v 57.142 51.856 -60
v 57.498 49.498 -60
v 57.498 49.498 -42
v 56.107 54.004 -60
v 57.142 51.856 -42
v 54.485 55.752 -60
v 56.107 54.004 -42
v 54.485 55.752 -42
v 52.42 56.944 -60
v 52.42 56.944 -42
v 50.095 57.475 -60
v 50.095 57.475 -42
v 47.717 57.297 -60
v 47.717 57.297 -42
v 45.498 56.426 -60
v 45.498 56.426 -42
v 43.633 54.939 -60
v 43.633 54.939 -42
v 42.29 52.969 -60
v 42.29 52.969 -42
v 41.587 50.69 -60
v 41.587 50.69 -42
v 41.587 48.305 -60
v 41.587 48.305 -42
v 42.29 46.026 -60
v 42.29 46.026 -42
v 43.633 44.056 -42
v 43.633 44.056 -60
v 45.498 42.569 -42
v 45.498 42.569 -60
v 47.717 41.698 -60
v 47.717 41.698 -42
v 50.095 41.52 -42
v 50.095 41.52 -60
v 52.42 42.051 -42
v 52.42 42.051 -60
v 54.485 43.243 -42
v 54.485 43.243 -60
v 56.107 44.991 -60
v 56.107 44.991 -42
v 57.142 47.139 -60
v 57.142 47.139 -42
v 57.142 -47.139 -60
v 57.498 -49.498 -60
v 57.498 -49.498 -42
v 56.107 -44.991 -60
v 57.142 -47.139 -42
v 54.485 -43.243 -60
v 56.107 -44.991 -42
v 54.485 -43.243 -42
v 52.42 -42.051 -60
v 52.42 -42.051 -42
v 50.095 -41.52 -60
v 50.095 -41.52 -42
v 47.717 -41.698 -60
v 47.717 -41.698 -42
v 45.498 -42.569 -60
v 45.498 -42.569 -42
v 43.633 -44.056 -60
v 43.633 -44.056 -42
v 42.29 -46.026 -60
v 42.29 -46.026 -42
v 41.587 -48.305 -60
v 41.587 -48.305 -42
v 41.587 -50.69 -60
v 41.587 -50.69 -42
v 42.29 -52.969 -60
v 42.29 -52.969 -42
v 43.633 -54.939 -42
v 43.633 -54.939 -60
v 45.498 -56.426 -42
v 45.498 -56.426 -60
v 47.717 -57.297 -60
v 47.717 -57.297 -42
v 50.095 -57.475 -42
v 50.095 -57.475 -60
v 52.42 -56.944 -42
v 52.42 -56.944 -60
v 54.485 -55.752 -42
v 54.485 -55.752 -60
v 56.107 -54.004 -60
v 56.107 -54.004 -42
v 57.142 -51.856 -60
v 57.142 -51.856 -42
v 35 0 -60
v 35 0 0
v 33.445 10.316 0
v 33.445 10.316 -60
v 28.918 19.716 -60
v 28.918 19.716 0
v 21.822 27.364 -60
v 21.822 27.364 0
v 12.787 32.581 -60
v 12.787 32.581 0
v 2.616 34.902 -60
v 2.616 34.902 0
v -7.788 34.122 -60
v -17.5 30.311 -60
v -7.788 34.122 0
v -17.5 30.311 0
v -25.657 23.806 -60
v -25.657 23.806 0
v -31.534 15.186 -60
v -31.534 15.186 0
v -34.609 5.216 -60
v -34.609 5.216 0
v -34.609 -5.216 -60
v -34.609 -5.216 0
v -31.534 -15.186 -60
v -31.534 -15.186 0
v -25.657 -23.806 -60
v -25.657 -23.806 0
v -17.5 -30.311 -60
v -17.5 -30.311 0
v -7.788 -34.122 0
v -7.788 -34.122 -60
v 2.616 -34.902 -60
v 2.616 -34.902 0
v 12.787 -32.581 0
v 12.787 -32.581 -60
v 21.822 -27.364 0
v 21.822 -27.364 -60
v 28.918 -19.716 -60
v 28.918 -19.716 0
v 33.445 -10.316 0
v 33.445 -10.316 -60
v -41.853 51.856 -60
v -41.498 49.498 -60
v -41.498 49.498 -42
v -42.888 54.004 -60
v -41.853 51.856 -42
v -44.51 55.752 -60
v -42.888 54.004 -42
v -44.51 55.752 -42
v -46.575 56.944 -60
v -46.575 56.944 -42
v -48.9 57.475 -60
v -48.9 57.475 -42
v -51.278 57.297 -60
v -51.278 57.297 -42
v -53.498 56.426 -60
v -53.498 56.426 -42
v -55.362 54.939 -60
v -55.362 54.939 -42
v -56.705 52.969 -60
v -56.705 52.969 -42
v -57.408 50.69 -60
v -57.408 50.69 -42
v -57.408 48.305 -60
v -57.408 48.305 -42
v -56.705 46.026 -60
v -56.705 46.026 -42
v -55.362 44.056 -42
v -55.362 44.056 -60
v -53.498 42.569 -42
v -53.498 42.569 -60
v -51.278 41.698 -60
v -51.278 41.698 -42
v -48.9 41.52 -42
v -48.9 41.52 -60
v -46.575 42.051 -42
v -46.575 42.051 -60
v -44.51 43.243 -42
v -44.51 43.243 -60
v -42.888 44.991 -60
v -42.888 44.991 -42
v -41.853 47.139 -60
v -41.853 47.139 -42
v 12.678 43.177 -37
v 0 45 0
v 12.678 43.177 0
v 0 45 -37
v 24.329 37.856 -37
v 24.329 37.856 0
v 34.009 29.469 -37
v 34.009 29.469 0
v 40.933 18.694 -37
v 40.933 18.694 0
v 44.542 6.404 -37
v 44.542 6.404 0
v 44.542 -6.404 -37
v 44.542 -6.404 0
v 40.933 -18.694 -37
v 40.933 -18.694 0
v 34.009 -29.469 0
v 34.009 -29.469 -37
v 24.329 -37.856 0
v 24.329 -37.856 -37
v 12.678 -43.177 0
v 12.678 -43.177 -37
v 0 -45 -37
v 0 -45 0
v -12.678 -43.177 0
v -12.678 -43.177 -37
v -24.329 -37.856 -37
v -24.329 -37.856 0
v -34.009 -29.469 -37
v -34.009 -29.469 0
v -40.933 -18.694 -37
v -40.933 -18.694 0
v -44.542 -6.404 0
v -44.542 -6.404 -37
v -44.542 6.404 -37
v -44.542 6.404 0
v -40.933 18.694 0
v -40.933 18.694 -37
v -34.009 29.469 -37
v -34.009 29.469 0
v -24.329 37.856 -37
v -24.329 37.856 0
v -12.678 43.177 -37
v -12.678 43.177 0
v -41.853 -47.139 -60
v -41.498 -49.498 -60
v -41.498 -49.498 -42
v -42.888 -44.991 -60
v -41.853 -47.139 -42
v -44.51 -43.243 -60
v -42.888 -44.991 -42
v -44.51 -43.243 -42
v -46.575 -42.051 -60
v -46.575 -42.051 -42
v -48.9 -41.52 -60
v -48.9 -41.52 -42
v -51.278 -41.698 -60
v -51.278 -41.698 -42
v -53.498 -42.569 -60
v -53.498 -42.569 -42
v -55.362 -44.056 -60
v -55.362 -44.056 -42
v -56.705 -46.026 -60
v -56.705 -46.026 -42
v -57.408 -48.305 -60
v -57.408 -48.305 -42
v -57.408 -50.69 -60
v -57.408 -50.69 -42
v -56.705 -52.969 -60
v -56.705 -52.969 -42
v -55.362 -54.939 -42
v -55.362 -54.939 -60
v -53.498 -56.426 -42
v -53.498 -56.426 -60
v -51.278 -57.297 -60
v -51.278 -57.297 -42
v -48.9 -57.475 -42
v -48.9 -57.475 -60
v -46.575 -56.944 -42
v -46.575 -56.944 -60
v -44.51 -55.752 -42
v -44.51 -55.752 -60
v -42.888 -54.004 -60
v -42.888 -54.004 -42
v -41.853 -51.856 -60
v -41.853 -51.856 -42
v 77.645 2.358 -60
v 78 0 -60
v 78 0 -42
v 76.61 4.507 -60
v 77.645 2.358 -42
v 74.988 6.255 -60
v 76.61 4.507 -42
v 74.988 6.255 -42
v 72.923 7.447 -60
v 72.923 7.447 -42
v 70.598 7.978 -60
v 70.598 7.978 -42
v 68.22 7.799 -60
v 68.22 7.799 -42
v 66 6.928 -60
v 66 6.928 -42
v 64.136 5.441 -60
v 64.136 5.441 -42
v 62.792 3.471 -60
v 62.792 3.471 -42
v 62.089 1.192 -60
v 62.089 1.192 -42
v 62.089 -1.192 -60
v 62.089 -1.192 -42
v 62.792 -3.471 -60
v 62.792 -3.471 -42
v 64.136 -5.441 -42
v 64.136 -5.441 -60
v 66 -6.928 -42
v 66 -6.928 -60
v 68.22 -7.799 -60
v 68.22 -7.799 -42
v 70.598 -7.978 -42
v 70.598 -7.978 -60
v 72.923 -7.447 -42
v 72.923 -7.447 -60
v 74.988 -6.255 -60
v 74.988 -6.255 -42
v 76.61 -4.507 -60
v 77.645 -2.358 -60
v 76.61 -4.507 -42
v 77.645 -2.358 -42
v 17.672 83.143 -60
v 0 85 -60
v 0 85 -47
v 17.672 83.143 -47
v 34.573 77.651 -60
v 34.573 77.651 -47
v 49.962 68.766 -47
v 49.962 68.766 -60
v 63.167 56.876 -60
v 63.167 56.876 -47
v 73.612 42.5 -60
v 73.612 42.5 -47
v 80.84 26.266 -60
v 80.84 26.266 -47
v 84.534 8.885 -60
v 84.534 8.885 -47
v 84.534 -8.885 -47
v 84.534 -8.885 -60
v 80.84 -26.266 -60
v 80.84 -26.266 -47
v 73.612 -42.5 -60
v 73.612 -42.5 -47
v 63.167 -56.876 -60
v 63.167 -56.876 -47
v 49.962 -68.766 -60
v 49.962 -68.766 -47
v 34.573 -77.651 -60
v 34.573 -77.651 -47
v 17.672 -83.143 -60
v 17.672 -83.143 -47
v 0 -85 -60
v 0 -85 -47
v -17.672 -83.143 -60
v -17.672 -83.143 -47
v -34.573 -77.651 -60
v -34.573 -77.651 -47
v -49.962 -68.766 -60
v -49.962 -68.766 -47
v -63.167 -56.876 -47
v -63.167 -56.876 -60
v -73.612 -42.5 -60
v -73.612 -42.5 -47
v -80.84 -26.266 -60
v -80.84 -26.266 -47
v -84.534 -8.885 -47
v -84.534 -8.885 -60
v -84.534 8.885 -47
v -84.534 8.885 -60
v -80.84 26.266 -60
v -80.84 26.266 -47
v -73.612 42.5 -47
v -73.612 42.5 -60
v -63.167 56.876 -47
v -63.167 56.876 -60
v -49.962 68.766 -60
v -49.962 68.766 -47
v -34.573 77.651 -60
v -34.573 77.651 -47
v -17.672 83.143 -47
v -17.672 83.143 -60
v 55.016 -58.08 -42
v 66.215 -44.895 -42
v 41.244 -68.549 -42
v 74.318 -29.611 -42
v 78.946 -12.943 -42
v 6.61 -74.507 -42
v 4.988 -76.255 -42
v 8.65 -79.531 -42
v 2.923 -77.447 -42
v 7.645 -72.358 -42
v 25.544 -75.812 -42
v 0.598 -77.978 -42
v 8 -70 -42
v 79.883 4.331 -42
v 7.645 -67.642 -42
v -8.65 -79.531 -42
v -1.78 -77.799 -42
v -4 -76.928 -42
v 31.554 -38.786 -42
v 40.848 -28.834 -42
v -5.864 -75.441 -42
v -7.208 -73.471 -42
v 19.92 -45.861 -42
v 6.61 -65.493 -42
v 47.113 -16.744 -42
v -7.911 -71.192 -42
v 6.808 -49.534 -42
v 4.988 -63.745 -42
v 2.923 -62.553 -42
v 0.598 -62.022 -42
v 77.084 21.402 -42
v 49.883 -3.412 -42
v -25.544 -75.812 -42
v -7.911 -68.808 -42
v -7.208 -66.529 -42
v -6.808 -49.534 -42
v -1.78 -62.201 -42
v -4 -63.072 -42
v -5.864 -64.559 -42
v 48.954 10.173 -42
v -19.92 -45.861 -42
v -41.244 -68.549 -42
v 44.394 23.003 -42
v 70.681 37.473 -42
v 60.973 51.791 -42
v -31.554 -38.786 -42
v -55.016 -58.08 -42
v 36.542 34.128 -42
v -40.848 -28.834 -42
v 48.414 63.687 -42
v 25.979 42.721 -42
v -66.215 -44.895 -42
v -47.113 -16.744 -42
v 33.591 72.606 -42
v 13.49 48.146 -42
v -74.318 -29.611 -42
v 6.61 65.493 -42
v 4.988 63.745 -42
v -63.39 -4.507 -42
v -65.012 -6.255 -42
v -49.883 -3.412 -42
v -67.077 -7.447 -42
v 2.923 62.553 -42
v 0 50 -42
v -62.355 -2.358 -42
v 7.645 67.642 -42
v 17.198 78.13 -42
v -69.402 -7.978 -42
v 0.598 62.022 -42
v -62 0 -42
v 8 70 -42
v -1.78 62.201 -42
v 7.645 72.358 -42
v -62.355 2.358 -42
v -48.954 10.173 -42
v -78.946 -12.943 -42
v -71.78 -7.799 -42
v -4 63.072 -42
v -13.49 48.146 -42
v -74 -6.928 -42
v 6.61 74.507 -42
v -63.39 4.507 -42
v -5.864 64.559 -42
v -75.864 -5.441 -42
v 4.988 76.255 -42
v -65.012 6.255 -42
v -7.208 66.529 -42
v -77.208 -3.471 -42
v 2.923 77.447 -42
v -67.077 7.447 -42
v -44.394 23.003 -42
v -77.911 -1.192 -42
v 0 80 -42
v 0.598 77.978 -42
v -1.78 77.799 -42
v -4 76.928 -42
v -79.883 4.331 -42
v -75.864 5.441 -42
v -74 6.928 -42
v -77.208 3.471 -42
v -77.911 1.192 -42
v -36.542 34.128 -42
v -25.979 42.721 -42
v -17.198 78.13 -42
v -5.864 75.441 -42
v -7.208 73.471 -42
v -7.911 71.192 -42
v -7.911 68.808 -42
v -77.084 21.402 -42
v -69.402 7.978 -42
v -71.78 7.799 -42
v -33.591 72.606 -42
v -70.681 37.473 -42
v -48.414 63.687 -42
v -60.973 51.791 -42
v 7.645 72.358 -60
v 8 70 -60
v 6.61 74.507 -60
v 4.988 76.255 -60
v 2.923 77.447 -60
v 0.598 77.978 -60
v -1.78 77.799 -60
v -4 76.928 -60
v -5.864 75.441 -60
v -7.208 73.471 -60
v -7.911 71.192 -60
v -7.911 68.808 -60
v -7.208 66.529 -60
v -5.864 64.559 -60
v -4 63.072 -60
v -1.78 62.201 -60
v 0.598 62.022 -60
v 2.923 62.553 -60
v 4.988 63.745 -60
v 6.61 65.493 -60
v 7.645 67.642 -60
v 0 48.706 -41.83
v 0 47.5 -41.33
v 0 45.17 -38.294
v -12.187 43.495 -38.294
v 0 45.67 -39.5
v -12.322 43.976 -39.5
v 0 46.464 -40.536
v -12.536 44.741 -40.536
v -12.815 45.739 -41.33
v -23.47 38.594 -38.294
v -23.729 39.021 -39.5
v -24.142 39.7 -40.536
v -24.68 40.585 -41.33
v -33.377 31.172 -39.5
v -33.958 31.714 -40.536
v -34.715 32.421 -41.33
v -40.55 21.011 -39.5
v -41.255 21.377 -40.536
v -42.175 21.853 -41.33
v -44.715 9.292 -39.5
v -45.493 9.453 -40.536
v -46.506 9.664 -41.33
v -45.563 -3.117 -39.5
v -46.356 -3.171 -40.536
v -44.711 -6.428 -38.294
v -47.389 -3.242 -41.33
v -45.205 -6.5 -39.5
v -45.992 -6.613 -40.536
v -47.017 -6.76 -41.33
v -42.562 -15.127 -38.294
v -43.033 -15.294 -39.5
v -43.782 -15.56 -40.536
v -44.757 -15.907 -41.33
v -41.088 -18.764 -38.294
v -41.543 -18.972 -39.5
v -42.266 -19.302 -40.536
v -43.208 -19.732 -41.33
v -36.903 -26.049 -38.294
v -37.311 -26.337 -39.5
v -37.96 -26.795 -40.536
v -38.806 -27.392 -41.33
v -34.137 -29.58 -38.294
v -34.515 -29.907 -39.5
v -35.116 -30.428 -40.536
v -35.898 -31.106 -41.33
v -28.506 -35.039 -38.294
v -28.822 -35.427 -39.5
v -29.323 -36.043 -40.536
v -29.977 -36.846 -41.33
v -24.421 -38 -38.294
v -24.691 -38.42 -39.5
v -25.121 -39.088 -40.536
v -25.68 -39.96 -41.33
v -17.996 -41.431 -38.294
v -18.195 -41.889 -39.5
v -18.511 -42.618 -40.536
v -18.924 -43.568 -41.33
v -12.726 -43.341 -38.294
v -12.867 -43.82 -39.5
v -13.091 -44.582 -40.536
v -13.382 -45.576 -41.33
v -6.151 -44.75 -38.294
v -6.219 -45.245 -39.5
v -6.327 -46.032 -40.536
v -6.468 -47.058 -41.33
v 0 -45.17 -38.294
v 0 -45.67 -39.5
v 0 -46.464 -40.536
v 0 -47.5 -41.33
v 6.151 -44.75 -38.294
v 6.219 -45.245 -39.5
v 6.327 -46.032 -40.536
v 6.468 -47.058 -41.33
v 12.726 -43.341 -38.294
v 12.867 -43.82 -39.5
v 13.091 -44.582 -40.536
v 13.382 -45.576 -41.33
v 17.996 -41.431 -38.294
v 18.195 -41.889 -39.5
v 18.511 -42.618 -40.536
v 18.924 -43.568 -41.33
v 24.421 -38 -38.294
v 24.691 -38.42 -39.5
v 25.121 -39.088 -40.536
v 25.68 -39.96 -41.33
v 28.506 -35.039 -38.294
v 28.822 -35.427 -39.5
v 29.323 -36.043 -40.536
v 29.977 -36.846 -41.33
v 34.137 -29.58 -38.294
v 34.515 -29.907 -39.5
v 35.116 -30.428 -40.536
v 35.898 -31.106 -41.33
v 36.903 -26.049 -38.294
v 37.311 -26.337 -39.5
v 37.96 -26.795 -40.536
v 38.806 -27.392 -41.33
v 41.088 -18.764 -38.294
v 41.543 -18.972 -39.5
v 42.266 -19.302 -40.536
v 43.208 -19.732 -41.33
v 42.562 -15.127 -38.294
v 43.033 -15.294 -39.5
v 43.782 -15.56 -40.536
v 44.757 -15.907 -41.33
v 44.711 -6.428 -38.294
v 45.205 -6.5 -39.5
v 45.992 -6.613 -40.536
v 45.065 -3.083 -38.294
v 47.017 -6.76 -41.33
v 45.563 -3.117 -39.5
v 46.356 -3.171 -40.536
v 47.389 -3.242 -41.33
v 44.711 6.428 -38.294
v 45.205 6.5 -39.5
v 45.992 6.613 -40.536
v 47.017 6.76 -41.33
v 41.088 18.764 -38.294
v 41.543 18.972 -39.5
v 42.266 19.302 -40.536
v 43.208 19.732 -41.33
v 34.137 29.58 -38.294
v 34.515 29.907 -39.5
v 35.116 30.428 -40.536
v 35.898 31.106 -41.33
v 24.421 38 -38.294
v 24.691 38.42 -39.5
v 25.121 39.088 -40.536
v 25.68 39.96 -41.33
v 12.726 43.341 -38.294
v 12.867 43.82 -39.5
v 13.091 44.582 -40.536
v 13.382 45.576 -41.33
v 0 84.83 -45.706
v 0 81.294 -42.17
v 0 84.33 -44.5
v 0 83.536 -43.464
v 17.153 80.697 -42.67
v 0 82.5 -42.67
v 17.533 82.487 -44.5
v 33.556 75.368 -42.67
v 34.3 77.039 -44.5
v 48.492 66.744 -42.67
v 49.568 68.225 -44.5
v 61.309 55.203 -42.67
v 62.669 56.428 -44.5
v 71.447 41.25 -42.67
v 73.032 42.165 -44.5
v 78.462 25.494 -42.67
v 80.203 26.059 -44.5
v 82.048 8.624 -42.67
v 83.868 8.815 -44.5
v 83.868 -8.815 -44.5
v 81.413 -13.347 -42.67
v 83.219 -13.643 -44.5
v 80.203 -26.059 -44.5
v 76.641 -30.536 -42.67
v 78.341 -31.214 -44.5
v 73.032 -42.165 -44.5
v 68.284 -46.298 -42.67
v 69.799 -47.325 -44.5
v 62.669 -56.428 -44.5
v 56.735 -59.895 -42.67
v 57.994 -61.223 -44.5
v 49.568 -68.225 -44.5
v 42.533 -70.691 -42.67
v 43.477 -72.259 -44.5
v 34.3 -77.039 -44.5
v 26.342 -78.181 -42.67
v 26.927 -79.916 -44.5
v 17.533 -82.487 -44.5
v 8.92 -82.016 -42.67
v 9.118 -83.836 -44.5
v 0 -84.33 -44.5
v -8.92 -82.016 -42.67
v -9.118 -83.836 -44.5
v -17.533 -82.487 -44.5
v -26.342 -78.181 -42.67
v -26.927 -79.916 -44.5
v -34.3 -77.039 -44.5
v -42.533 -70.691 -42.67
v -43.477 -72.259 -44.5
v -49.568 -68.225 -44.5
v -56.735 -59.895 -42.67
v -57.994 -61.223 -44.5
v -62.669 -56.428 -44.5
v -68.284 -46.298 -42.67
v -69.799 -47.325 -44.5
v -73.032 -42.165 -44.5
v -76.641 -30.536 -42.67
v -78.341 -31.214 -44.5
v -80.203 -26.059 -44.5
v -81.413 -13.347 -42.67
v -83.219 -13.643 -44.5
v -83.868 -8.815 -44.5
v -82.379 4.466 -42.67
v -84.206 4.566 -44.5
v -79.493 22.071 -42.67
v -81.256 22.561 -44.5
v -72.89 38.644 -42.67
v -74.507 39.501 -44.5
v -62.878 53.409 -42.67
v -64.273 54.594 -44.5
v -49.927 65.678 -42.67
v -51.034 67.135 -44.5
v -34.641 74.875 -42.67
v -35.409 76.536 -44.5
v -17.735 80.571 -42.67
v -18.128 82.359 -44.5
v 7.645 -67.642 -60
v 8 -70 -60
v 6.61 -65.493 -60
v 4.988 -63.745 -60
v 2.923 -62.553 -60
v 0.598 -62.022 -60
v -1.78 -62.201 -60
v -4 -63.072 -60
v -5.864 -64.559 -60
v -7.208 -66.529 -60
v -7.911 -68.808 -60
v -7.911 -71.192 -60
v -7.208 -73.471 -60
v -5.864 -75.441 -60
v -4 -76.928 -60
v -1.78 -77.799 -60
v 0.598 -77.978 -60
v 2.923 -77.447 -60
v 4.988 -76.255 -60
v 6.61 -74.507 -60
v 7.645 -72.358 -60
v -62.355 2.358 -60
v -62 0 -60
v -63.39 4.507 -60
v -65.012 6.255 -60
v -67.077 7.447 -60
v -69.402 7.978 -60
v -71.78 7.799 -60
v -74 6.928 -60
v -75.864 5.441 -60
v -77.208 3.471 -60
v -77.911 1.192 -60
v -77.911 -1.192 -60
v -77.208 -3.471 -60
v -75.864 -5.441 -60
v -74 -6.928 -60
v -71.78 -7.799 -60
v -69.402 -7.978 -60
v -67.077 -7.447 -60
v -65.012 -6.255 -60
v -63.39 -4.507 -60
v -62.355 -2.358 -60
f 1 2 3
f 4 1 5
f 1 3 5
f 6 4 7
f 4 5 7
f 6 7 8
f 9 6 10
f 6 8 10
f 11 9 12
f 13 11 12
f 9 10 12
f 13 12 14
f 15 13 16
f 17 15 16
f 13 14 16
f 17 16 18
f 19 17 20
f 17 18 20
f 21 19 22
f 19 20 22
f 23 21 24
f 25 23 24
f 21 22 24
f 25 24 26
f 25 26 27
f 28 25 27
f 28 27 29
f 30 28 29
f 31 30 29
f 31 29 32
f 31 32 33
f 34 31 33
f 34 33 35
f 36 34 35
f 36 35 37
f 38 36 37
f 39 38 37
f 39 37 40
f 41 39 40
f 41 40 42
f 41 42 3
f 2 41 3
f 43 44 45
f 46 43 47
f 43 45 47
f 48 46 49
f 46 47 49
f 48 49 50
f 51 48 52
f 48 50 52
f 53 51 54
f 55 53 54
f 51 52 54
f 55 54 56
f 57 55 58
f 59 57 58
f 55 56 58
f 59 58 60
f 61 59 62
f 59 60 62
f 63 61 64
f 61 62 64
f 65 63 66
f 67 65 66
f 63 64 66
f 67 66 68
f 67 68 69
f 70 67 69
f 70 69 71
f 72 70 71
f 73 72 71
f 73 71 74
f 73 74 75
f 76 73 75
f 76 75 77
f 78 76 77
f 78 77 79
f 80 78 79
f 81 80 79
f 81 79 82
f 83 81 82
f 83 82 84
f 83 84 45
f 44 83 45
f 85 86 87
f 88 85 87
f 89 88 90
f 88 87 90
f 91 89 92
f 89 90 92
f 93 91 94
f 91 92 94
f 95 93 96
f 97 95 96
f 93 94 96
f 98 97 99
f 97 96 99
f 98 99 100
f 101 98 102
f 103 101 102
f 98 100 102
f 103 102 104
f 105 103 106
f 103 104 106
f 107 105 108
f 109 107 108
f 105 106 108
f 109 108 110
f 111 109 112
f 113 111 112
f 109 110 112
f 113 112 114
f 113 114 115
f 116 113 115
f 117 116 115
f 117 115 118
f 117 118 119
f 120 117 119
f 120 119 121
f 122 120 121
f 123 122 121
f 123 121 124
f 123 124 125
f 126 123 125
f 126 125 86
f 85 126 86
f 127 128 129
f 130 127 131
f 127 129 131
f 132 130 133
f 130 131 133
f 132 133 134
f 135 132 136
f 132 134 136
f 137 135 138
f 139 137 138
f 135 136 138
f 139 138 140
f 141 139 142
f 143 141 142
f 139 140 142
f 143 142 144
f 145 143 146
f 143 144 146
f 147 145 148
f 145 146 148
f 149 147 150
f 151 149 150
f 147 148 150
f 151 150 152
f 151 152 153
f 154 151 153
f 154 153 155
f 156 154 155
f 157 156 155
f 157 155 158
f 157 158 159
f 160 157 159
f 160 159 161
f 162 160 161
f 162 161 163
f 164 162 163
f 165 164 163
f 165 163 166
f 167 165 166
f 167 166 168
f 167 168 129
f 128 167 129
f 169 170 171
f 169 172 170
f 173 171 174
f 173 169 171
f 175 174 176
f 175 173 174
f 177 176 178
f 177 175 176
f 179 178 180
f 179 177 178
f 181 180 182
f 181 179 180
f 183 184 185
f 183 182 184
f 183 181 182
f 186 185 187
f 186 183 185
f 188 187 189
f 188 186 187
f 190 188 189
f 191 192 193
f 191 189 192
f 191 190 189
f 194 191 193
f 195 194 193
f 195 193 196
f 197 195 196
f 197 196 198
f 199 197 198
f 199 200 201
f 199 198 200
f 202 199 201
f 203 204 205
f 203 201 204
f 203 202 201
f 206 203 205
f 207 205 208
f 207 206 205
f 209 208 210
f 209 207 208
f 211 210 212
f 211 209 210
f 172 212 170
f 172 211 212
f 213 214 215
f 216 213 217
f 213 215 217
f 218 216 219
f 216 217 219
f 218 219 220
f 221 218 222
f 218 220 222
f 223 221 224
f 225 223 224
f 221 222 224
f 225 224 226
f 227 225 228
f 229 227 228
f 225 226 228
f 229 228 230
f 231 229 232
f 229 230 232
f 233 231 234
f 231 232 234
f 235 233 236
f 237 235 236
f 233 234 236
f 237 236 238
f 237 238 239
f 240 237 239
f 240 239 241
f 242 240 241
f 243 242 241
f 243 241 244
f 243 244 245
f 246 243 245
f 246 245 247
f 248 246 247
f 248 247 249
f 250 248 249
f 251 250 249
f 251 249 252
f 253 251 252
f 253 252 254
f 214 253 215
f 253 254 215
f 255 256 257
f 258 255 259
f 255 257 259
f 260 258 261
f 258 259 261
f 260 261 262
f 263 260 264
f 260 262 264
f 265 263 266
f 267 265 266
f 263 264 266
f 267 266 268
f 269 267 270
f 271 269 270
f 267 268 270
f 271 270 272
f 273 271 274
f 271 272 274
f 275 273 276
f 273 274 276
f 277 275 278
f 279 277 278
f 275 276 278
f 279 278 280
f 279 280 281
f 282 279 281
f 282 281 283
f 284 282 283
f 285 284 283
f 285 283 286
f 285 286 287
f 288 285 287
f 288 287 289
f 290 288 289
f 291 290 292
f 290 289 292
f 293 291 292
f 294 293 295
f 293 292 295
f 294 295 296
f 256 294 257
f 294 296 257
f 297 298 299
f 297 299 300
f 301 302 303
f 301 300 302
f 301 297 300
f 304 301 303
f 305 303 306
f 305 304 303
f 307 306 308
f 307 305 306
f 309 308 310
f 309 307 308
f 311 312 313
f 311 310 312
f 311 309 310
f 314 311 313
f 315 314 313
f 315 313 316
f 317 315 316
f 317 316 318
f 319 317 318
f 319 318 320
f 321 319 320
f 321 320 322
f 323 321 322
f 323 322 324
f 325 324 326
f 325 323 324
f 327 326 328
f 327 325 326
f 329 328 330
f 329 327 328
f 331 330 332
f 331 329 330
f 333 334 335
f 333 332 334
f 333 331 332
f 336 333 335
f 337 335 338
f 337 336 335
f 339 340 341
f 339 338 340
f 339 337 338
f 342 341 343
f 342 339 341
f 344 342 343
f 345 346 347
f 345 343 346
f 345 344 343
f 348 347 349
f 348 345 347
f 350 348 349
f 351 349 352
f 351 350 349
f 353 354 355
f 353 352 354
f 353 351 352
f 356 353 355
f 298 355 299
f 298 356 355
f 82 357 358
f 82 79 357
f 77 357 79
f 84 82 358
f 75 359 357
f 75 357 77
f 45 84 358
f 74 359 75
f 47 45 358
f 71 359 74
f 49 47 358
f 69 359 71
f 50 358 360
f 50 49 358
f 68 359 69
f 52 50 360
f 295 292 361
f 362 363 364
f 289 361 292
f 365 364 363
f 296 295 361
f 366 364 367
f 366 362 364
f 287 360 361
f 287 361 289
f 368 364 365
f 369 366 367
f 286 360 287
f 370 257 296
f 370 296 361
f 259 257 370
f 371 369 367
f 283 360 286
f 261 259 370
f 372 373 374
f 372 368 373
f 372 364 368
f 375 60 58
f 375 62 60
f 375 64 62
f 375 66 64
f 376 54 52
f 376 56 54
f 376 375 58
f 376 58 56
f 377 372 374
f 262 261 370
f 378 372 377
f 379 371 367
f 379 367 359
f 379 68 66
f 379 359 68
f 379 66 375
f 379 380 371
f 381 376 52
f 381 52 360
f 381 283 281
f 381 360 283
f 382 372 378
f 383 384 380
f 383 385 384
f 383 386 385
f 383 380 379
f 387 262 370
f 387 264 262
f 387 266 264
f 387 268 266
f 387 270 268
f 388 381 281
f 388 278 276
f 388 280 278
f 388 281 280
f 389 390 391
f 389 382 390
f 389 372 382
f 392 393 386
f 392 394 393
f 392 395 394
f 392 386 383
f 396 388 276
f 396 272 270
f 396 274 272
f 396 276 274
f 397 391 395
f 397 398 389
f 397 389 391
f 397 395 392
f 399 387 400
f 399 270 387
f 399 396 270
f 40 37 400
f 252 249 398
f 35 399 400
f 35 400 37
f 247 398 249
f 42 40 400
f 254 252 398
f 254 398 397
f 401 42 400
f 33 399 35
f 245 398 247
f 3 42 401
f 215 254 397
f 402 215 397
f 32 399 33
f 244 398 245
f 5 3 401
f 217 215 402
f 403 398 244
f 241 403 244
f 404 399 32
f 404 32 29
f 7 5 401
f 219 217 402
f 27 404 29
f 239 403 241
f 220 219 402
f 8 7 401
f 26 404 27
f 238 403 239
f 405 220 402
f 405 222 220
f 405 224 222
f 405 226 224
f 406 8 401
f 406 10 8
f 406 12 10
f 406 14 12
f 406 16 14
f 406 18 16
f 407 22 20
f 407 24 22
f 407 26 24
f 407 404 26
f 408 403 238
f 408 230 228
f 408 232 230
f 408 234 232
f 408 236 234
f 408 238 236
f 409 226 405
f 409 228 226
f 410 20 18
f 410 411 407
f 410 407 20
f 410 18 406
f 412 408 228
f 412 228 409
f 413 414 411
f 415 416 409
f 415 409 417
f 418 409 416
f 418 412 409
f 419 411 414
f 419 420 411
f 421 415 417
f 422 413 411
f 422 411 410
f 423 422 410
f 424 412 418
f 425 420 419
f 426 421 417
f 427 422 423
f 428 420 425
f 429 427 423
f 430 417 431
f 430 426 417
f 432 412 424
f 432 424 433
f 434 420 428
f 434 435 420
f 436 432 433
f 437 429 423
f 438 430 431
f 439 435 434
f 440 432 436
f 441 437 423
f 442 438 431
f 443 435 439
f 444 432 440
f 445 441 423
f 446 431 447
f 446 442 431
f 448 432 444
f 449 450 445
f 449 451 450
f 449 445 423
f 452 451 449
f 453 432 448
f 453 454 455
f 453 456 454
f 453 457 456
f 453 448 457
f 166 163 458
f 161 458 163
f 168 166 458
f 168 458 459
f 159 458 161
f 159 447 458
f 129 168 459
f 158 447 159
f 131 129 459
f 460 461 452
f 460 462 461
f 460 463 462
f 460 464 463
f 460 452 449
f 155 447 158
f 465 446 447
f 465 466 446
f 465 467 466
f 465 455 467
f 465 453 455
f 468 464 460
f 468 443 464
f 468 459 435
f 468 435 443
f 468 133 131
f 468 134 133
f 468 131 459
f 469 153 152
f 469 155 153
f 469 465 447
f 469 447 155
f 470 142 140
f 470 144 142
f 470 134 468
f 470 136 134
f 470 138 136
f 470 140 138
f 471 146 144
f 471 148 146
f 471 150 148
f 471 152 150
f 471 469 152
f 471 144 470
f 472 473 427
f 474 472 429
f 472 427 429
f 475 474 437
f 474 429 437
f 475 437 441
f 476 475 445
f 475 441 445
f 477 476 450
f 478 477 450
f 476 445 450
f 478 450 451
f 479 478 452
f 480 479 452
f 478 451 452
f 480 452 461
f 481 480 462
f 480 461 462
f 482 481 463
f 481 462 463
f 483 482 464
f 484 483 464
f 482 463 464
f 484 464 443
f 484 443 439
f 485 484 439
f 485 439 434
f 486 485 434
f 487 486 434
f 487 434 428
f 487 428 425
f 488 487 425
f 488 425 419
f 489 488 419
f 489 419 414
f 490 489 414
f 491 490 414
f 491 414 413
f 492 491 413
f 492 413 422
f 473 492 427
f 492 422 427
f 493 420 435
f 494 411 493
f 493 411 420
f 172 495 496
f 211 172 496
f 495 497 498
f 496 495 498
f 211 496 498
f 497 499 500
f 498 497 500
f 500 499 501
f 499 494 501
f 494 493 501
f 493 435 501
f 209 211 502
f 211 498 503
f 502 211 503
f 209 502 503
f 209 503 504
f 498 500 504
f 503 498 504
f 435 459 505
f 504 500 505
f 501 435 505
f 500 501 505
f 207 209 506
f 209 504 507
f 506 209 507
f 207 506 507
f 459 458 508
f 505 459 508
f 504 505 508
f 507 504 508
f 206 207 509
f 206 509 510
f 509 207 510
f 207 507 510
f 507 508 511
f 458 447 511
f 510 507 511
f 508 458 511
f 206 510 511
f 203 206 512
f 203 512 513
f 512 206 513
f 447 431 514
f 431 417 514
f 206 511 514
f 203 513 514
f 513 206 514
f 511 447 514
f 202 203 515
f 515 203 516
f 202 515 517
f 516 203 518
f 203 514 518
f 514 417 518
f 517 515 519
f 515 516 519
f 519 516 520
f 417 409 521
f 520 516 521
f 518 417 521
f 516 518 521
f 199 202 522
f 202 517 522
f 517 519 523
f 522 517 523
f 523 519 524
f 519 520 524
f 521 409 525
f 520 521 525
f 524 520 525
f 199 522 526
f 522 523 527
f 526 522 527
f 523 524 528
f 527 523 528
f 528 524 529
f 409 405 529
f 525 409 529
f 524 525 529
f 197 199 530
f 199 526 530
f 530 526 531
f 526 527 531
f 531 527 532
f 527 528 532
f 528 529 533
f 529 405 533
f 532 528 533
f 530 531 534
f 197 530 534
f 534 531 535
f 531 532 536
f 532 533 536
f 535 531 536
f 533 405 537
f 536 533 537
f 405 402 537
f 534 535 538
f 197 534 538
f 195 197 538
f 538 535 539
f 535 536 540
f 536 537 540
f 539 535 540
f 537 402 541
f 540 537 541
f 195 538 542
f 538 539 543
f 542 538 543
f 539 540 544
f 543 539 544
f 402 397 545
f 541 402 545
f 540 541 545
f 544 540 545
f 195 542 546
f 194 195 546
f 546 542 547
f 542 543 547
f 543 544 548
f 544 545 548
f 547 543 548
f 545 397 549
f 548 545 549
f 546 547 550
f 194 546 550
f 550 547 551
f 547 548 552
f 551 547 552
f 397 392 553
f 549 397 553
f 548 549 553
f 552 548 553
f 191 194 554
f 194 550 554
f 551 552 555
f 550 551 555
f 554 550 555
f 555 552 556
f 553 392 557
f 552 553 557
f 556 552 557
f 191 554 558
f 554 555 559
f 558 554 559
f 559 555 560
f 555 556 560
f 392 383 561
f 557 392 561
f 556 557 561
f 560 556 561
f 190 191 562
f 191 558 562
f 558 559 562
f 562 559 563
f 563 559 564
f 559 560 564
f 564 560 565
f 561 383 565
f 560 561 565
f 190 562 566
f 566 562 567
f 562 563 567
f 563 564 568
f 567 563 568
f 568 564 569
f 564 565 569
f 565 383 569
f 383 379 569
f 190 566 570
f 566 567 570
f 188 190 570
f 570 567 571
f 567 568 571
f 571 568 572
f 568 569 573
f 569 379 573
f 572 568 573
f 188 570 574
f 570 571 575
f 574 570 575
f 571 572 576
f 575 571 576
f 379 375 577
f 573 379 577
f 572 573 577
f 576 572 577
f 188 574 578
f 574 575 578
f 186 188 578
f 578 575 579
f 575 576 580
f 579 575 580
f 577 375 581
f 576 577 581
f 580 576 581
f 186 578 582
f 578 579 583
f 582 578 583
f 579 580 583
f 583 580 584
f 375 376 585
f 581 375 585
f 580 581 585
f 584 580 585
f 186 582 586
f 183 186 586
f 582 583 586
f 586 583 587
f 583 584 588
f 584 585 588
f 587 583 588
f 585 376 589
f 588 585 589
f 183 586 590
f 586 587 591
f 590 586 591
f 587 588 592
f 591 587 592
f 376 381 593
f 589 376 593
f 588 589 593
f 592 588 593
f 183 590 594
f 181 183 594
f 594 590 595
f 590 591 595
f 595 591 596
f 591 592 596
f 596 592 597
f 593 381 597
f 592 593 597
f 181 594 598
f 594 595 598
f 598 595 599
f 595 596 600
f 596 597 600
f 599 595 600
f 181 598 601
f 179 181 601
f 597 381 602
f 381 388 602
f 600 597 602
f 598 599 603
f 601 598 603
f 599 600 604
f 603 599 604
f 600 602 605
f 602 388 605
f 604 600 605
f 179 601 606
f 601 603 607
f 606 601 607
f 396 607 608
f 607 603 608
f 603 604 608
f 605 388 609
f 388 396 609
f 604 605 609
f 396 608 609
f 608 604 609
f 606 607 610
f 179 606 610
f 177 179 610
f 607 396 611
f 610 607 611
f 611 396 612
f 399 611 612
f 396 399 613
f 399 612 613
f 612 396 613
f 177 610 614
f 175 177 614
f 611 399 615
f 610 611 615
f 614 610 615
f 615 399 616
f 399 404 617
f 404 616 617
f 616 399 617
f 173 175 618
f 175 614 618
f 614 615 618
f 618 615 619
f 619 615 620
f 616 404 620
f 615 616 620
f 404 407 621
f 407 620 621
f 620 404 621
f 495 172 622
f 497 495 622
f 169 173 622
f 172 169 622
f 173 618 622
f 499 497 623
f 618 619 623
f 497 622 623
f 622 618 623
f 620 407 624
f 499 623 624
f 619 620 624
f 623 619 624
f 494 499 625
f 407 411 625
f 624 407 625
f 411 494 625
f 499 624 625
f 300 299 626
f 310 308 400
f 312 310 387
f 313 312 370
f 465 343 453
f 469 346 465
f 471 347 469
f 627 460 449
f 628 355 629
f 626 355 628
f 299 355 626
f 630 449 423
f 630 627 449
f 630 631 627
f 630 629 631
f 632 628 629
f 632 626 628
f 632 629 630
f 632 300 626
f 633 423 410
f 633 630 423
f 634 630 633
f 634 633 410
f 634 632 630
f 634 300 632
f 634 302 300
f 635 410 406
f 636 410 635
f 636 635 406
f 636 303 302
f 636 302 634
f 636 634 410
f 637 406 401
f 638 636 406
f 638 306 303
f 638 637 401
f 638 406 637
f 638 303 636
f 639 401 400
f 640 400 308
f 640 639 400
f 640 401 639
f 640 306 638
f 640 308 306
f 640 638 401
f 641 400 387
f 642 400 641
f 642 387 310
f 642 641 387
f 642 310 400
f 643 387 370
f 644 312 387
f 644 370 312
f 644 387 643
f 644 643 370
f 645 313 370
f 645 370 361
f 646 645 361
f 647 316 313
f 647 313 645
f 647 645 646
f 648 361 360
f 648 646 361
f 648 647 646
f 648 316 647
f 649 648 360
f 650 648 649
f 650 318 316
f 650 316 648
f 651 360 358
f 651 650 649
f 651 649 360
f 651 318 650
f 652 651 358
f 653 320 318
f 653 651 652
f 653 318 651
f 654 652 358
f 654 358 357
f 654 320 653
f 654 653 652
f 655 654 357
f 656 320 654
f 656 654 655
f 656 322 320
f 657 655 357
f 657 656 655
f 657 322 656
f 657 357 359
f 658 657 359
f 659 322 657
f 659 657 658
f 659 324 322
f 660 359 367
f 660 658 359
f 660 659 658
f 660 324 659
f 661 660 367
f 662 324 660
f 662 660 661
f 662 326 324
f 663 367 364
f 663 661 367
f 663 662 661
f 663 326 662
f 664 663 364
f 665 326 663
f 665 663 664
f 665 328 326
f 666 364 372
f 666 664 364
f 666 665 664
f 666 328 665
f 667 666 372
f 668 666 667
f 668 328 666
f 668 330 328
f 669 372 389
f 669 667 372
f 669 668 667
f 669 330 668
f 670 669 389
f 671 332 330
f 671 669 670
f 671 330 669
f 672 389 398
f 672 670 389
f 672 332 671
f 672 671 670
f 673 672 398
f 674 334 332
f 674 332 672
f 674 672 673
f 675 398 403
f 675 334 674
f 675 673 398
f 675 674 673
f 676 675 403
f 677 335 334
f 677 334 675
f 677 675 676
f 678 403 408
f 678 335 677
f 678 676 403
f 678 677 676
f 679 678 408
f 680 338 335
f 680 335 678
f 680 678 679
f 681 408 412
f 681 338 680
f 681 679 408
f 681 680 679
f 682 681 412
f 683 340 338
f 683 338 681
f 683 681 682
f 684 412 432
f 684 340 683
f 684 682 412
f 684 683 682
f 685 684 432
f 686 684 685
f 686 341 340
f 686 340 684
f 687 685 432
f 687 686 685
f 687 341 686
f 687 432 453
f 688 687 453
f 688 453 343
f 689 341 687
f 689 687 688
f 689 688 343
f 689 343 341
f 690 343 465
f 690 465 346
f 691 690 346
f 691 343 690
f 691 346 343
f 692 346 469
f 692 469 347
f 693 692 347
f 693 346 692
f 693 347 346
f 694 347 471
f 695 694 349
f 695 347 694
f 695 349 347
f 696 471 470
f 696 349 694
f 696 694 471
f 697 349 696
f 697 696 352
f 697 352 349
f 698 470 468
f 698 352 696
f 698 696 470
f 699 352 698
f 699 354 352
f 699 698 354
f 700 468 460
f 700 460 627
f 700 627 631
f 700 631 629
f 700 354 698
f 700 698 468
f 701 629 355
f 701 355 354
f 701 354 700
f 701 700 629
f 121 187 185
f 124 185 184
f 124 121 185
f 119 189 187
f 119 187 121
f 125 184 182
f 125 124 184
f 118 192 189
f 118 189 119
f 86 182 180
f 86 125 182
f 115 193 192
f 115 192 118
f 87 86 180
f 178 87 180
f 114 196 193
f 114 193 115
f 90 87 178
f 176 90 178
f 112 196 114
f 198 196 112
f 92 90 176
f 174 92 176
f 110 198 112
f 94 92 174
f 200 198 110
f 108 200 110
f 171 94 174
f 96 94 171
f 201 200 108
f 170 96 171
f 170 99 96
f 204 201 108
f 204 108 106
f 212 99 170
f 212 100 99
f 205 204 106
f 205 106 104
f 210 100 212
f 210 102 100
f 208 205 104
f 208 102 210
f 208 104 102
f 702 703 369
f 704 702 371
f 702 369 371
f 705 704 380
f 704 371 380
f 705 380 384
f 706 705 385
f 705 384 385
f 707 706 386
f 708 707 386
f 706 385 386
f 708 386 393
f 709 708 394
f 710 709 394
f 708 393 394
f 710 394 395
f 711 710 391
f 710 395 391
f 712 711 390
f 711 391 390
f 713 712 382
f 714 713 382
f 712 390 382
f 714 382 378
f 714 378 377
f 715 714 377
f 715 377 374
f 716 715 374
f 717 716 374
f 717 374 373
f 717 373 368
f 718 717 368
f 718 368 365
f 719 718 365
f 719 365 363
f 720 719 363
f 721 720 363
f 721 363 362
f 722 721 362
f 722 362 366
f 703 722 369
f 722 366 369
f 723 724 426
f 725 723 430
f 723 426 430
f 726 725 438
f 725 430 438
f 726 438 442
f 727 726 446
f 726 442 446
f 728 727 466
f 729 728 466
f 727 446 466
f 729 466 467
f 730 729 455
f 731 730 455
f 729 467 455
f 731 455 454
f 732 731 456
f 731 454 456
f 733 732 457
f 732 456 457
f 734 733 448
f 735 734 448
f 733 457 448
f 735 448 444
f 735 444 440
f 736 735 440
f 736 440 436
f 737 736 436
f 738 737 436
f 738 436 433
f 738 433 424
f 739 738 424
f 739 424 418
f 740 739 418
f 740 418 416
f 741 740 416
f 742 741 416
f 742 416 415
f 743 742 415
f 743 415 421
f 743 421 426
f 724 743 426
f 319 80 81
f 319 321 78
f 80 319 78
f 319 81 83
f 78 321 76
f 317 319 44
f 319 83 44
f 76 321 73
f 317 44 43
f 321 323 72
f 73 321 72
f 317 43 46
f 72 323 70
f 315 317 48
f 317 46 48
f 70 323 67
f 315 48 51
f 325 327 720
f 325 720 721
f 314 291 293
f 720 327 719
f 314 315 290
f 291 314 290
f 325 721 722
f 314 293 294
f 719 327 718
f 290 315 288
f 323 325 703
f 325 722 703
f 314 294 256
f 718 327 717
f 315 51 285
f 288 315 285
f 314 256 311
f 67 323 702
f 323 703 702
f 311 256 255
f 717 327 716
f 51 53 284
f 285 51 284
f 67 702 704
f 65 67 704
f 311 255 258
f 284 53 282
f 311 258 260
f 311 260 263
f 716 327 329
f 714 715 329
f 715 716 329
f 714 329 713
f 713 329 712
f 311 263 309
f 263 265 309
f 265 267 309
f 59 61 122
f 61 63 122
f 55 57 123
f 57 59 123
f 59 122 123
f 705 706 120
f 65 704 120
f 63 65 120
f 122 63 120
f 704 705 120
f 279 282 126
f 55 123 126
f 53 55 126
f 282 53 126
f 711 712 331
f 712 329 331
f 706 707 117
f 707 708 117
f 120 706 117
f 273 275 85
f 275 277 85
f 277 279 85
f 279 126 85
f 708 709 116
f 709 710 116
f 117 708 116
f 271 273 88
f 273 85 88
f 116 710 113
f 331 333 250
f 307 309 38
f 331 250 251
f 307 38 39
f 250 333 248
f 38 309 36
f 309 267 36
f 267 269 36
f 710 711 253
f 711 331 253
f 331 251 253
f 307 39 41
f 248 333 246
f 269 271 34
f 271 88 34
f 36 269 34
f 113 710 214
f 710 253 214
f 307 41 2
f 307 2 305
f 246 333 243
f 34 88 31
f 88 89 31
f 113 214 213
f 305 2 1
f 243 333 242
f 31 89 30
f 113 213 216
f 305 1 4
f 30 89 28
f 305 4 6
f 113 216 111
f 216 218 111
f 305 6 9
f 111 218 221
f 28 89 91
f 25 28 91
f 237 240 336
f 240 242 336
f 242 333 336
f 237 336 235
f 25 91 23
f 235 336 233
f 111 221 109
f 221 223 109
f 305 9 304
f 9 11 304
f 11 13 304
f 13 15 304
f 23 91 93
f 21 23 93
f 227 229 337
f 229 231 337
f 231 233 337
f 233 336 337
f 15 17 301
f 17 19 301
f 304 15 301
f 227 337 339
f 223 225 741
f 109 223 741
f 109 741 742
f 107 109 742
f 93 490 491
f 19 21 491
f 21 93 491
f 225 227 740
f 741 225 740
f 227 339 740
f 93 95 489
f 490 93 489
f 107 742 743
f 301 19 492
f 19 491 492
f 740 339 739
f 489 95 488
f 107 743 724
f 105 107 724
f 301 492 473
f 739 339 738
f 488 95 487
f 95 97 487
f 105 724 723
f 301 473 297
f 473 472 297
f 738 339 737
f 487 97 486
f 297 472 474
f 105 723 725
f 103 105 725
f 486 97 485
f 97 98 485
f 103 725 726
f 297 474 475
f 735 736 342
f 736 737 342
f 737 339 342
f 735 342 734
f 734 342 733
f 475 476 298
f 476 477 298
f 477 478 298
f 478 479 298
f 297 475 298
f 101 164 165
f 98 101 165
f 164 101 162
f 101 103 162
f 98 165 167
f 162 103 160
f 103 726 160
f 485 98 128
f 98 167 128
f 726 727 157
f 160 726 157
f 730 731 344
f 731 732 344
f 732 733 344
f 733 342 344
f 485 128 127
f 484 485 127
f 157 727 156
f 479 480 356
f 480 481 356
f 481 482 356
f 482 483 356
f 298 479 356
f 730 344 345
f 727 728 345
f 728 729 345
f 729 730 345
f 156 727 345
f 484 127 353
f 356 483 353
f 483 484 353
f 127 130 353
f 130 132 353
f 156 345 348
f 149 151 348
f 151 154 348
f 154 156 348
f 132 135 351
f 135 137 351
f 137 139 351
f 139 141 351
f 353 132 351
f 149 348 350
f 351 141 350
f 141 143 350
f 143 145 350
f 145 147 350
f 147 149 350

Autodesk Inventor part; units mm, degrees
ref_plane "YZ Plane" through (0, 0, 0) normal (1, 0, 0) x (0, 1, 0)
ref_plane "XZ Plane" through (0, 0, 0) normal (0, 1, 0) x (-1, 0, 0)
ref_plane "XY Plane" through (0, 0, 0) normal (0, 0, 1) x (1, 0, 0)
sketch "草圖1" plane through (0, 0, 0) normal (1, 0, 0) x (0, 1, 0)
  line L0 (0, 0) -> (45, 0)
  line L1 (45, 0) -> (45, -42)
  line L2 (45, -42) -> (85, -42)
  line L3 (85, -42) -> (85, -60)
  line L4 (85, -60) -> (0, -60)
  line L5 (0, -60) -> (0, 0)
  dimension "d0" = 60
  dimension "d1" = 85
  dimension "d2" = 42
  dimension "d3" = 40
revolve "迴轉1" add sketch "草圖1" angle 360 about axis through (0, 0, -60) along (0, 0, 1)
sketch "草圖2" plane through (0, 0, -42) normal (0, 0, 1) x (1, 0, 0)
  circle A0 centre (0, 0) radius 70 construction
  circle A1 centre (0, 70) radius 8
  circle A2 centre (-49.4975, 49.4975) radius 8
  circle A3 centre (-70, 0) radius 8
  circle A4 centre (-49.4975, -49.4975) radius 8
  circle A5 centre (0, -70) radius 8
  circle A6 centre (49.4975, -49.4975) radius 8
  circle A7 centre (70, 0) radius 8
  circle A8 centre (49.4975, 49.4975) radius 8
  dimension "d5" = 140
  dimension "d6" = 16
  dimension "d7" = 70
  dimension "d12" = 360
extrude "擠出1" cut sketch "草圖2" against normal up to next
sketch "草圖4" plane through (0, 0, 0) normal (0, 0, 1) x (1, 0, 0)
  circle A0 centre (0, 0) radius 35
  dimension "d14" = 70
extrude "擠出2" cut sketch "草圖4" against normal up to next
fillet "圓角1" radius 5 2 edges at (0, -45, -42) (0, -85, -42)
properties part number "410571040-T3"
